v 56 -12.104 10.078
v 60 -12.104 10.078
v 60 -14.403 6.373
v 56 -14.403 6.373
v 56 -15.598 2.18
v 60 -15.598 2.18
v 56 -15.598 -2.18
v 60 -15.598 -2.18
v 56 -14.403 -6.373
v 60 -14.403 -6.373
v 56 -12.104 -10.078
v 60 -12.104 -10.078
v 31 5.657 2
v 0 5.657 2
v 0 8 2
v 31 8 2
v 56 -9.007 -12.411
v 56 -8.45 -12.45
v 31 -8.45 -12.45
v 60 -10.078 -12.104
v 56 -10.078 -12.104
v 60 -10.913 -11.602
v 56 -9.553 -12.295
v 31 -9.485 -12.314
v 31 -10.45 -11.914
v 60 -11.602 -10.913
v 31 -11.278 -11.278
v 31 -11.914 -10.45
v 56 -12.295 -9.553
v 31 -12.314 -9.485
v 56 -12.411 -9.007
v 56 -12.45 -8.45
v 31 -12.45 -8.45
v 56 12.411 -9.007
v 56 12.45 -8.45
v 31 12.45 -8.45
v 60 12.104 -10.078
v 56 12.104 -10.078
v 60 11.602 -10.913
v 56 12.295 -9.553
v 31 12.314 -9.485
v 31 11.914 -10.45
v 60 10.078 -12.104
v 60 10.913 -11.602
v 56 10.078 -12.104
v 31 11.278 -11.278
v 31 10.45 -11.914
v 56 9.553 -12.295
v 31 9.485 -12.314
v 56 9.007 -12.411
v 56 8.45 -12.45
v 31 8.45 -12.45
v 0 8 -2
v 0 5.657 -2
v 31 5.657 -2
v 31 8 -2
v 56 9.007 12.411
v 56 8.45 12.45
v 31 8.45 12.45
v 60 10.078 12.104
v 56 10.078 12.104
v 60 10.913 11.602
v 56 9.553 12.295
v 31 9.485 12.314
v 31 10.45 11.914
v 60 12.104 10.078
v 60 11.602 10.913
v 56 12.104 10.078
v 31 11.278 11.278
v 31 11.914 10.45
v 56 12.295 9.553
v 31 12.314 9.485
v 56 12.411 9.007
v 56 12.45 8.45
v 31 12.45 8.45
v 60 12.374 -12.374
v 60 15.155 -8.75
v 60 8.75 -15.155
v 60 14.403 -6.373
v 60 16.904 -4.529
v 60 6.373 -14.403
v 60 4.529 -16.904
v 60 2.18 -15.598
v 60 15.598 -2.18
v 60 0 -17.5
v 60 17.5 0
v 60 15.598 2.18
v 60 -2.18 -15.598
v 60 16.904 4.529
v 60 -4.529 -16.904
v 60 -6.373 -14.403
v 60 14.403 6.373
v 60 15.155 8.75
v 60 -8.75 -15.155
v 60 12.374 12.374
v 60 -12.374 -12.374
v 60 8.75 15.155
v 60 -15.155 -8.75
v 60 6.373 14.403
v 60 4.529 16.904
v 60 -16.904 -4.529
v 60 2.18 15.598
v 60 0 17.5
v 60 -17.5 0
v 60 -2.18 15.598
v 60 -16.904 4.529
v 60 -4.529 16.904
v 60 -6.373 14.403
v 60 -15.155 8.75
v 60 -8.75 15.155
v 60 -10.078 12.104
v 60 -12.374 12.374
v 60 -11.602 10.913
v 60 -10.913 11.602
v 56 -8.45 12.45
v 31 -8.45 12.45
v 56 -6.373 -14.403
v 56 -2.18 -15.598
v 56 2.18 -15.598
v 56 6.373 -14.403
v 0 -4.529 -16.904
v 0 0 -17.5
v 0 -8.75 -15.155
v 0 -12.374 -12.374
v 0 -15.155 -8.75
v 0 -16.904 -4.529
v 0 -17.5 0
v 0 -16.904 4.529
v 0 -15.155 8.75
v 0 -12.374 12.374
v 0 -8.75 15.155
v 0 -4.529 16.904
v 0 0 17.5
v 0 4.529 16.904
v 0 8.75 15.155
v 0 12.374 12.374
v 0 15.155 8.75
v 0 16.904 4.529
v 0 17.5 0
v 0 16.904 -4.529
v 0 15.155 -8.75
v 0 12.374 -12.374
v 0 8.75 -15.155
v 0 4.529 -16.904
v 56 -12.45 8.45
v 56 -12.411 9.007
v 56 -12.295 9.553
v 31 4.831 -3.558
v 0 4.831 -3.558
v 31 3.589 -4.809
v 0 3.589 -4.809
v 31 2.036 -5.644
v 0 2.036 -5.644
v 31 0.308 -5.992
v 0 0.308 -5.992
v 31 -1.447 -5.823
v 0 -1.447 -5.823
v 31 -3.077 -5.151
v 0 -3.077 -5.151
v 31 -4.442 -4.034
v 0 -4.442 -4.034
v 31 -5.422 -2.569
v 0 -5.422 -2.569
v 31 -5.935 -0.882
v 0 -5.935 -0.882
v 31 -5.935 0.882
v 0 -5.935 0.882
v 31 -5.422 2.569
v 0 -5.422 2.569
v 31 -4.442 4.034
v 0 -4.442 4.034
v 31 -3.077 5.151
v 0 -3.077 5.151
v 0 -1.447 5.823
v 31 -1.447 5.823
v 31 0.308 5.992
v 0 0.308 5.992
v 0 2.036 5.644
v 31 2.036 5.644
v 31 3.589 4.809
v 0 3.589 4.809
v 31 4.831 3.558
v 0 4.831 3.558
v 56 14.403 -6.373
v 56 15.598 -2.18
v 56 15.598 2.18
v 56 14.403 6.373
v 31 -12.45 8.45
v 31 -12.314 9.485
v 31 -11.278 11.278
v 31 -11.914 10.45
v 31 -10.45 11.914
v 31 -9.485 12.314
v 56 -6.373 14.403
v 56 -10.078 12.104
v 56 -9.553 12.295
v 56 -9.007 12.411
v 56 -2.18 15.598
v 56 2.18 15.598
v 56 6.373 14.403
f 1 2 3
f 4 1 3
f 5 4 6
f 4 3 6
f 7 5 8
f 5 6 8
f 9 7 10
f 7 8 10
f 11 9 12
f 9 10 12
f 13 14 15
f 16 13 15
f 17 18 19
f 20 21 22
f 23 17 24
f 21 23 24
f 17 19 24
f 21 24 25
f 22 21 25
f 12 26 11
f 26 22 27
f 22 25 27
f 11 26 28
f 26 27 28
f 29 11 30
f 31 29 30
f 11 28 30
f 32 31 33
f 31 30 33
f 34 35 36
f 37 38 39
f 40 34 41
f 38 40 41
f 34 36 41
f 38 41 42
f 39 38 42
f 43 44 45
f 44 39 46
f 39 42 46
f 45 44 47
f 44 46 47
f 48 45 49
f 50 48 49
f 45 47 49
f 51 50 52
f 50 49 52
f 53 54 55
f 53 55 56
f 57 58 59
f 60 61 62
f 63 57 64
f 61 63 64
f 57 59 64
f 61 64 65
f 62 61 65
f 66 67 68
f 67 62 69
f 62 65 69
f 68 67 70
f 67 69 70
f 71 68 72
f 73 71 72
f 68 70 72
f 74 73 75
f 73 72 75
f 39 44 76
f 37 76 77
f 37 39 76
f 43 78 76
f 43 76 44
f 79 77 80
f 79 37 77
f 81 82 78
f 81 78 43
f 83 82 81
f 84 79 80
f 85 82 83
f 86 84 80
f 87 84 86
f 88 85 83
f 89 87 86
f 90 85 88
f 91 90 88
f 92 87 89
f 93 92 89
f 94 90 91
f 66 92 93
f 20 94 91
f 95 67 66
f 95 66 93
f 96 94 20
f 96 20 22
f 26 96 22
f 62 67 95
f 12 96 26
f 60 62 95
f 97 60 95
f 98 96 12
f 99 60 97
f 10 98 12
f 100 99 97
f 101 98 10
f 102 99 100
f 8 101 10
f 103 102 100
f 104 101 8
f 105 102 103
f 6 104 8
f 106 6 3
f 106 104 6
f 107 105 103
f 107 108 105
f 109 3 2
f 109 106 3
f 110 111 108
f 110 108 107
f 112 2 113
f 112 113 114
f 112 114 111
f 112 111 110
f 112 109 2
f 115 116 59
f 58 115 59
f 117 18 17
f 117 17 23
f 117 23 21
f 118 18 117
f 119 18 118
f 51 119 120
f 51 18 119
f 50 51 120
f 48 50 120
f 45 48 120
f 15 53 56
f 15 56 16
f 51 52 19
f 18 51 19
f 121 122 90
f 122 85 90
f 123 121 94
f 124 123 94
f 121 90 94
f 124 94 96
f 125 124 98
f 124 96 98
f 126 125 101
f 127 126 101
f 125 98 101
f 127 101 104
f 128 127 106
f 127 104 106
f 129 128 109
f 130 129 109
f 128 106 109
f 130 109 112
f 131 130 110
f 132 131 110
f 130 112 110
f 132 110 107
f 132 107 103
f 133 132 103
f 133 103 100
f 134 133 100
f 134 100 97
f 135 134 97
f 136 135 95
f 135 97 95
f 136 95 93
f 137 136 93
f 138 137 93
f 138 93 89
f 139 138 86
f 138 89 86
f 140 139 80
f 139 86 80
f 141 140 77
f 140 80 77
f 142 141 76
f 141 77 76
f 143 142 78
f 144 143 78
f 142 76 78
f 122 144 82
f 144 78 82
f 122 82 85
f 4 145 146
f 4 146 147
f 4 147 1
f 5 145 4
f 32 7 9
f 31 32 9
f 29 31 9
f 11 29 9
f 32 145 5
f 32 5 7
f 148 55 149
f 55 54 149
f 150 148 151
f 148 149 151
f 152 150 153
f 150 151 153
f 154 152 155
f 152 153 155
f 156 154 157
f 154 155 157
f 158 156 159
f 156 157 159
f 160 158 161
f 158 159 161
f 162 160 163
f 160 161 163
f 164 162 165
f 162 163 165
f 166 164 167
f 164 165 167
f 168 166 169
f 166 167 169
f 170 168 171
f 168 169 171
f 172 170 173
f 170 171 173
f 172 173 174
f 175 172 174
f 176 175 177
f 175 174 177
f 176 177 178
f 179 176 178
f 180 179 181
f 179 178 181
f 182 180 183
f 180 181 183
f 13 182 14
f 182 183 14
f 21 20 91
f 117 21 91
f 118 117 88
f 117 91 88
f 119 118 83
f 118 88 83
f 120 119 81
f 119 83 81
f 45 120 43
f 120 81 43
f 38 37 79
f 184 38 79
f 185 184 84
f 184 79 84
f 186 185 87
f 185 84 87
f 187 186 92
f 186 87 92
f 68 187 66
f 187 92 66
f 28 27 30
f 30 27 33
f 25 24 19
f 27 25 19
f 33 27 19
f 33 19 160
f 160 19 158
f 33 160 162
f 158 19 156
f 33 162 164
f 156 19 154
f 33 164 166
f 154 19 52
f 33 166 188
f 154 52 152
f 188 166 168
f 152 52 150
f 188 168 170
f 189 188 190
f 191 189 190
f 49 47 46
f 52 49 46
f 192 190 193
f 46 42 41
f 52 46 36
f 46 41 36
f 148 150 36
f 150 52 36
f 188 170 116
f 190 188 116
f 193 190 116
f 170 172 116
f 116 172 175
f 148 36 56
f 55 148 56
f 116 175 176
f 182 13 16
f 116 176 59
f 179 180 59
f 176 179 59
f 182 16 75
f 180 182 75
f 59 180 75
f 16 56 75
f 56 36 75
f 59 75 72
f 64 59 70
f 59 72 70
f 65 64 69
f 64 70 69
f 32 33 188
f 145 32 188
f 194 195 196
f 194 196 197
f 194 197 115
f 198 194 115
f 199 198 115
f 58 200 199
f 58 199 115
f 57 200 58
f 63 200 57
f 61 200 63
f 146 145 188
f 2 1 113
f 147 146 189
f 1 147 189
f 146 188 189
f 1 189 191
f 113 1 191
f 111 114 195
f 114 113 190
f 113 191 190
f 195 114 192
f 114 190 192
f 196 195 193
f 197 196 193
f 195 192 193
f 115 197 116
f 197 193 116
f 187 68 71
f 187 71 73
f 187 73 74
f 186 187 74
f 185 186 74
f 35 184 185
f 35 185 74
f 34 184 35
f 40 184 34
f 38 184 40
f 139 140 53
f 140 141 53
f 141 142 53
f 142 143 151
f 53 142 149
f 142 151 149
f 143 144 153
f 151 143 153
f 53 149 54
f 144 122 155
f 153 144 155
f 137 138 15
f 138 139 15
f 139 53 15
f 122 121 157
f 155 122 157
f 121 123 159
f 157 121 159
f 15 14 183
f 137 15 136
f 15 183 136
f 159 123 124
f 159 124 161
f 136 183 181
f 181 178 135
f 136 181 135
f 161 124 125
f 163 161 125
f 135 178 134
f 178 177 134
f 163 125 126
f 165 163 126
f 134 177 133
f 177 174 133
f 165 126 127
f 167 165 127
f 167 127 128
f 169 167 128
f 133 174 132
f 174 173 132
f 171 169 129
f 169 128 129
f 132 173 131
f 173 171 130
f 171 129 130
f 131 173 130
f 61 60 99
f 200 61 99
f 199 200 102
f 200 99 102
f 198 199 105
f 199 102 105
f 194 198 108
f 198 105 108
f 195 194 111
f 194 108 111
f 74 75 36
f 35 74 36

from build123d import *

# Parameters (mm, degrees)
SKETCH1_W               = 60
SKETCH1_H               = 17.5
SKETCH3_R               = 15.75
CUT_EXTRUDE1_DEPTH      = 4
CUT_EXTRUDE2_DEPTH      = 25
CUT_EXTRUDE2_DEPTH_BACK = 25
SKETCH5_R               = 6
CUT_EXTRUDE3_DEPTH      = 65.903774929
SKETCH6_W               = 4
SKETCH6_H               = 4
CUT_EXTRUDE5_DEPTH      = 65.903774929


with BuildPart() as part:
    # Sketch1 → Revolve1 (revolve)
    with BuildSketch(Plane.XY, mode=Mode.PRIVATE) as revolve1_sk:
        with Locations((30, 8.75)):
            Rectangle(SKETCH1_W, SKETCH1_H)
    revolve(revolve1_sk.sketch.rotate(Axis((0, 0, 0), (-1, 0, 0)), 90), axis=Axis((0, 0, 0), (-1, 0, 0)))

    # Sketch3 → Cut-Extrude1 (cut)
    with BuildSketch(Plane(origin=(60, 0, 0), x_dir=(0, 0, -1), z_dir=(1, 0, 0))):
        Circle(SKETCH3_R)
    extrude(amount=-CUT_EXTRUDE1_DEPTH, mode=Mode.SUBTRACT)

    # Sketch4 → Cut-Extrude2 (cut, two sides: drawn at the far end of the back side and taken through both)
    with BuildSketch(Plane(origin=(56, 0, 0), x_dir=(0, 0, -1), z_dir=(1, 0, 0)).offset(-CUT_EXTRUDE2_DEPTH_BACK)):
        with BuildLine():
            Line((-8.45, 12.45), (8.45, 12.45))
            ThreePointArc((8.45, 12.45), (11.278427125, 11.278427125), (12.45, 8.45))
            Line((12.45, 8.45), (12.45, -8.45))
            ThreePointArc((12.45, -8.45), (11.278427125, -11.278427125), (8.45, -12.45))
            Line((8.45, -12.45), (-8.45, -12.45))
            ThreePointArc((-8.45, -12.45), (-11.278427125, -11.278427125), (-12.45, -8.45))
            Line((-12.45, -8.45), (-12.45, 8.45))
            ThreePointArc((-12.45, 8.45), (-11.278427125, 11.278427125), (-8.45, 12.45))
        make_face()
    extrude(amount=CUT_EXTRUDE2_DEPTH + CUT_EXTRUDE2_DEPTH_BACK, mode=Mode.SUBTRACT)

    # Sketch5 → Cut-Extrude3 (cut, through all)
    with BuildSketch(Plane.ZY):
        Circle(SKETCH5_R)
    extrude(amount=-CUT_EXTRUDE3_DEPTH, mode=Mode.SUBTRACT)

    # Sketch6 → Cut-Extrude5 (cut, through all)
    with BuildSketch(Plane.ZY):
        with Locations((0, 6)):
            Rectangle(SKETCH6_W, SKETCH6_H)
    extrude(amount=-CUT_EXTRUDE5_DEPTH, mode=Mode.SUBTRACT)


solid = part.part
